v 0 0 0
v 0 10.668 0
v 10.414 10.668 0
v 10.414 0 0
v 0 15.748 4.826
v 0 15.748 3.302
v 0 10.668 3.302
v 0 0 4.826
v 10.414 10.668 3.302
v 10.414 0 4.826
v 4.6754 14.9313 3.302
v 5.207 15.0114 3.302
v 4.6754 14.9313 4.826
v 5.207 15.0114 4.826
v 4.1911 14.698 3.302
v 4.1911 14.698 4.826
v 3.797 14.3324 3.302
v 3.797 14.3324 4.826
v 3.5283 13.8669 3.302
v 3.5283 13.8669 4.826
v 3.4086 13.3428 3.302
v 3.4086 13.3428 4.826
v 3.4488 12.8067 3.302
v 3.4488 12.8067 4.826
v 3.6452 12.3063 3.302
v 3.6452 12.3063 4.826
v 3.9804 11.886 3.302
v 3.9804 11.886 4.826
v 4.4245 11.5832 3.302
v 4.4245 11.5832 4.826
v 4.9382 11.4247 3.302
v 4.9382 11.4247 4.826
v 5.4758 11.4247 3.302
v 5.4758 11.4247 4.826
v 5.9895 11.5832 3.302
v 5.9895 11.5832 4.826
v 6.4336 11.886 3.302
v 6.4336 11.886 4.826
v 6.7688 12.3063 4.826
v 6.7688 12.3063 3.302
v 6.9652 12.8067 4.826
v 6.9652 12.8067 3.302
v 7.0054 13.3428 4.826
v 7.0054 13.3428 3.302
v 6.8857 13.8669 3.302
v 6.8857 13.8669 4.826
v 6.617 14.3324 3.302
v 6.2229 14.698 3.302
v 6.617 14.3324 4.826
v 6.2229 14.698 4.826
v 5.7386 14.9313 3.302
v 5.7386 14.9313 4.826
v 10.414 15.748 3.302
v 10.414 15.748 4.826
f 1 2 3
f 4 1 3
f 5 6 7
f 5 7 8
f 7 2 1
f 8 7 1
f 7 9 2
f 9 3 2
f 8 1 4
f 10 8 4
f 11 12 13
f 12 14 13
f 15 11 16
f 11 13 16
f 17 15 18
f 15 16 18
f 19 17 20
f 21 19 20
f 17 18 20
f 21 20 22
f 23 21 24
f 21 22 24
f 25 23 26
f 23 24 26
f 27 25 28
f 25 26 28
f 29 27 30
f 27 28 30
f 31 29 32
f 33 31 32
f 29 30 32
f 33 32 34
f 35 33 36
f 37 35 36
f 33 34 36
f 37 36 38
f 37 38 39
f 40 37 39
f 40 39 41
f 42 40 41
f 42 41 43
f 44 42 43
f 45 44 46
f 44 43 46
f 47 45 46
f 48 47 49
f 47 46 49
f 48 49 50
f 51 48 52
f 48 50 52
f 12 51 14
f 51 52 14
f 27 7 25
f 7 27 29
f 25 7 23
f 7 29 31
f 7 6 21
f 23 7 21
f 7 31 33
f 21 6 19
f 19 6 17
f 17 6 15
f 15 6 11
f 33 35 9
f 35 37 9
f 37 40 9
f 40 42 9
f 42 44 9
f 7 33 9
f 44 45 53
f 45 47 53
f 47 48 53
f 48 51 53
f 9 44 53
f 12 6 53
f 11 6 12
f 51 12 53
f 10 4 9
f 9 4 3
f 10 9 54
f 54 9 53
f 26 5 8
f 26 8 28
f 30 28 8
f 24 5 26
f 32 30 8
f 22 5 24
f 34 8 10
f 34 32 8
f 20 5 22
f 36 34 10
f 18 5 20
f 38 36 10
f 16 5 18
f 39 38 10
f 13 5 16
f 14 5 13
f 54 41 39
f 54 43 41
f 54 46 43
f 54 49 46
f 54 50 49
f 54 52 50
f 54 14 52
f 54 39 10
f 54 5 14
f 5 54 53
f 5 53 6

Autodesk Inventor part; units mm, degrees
ref_plane "YZ Plane" through (0, 0, 0) normal (1, 0, 0) x (0, 1, 0)
ref_plane "XZ Plane" through (0, 0, 0) normal (0, 1, 0) x (-1, 0, 0)
ref_plane "XY Plane" through (0, 0, 0) normal (0, 0, 1) x (1, 0, 0)
sketch "Sketch1" plane through (0, 0, 0) normal (0, 0, 1) x (1, 0, 0)
  line L0 (0, 0) -> (10.414, 0)
  line L1 (10.414, 0) -> (10.414, 10.668)
  line L2 (10.414, 10.668) -> (0, 10.668)
  line L3 (0, 10.668) -> (0, 0)
  dimension "d0" = 10.414
  dimension "d1" = 10.668
extrude "Extrusion1" add sketch "Sketch1" along normal blind 4.826
sketch "Sketch2" plane through (0, 0, 4.826) normal (0, 0, 1) x (1, 0, 0)
  line L0 (10.414, 10.668) -> (10.414, 0) projected
  line L1 (0, 10.668) -> (10.414, 10.668)
  line L2 (10.414, 10.668) -> (10.414, 15.748)
  line L3 (10.414, 15.748) -> (0, 15.748)
  line L4 (0, 15.748) -> (0, 10.668)
  point P0 (10.414, 5.334)
  dimension "d4" = 5.08
extrude "Extrusion2" add sketch "Sketch2" against normal blind 1.524
sketch "Sketch3" plane through (0, 0, 3.302) normal (0, 0, -1) x (-1, 0, 0)
  line L0 (0, 0) -> (-10.414, 0) projected
  point P0 (-5.207, 13.208)
  dimension "d7" = 13.208
hole "Hole1" at (5.207, 13.208, 3.302) direction (0, 0, 1) diameter 3.6068 end through all
properties part number "NMOS" material "ABS Plastic"
